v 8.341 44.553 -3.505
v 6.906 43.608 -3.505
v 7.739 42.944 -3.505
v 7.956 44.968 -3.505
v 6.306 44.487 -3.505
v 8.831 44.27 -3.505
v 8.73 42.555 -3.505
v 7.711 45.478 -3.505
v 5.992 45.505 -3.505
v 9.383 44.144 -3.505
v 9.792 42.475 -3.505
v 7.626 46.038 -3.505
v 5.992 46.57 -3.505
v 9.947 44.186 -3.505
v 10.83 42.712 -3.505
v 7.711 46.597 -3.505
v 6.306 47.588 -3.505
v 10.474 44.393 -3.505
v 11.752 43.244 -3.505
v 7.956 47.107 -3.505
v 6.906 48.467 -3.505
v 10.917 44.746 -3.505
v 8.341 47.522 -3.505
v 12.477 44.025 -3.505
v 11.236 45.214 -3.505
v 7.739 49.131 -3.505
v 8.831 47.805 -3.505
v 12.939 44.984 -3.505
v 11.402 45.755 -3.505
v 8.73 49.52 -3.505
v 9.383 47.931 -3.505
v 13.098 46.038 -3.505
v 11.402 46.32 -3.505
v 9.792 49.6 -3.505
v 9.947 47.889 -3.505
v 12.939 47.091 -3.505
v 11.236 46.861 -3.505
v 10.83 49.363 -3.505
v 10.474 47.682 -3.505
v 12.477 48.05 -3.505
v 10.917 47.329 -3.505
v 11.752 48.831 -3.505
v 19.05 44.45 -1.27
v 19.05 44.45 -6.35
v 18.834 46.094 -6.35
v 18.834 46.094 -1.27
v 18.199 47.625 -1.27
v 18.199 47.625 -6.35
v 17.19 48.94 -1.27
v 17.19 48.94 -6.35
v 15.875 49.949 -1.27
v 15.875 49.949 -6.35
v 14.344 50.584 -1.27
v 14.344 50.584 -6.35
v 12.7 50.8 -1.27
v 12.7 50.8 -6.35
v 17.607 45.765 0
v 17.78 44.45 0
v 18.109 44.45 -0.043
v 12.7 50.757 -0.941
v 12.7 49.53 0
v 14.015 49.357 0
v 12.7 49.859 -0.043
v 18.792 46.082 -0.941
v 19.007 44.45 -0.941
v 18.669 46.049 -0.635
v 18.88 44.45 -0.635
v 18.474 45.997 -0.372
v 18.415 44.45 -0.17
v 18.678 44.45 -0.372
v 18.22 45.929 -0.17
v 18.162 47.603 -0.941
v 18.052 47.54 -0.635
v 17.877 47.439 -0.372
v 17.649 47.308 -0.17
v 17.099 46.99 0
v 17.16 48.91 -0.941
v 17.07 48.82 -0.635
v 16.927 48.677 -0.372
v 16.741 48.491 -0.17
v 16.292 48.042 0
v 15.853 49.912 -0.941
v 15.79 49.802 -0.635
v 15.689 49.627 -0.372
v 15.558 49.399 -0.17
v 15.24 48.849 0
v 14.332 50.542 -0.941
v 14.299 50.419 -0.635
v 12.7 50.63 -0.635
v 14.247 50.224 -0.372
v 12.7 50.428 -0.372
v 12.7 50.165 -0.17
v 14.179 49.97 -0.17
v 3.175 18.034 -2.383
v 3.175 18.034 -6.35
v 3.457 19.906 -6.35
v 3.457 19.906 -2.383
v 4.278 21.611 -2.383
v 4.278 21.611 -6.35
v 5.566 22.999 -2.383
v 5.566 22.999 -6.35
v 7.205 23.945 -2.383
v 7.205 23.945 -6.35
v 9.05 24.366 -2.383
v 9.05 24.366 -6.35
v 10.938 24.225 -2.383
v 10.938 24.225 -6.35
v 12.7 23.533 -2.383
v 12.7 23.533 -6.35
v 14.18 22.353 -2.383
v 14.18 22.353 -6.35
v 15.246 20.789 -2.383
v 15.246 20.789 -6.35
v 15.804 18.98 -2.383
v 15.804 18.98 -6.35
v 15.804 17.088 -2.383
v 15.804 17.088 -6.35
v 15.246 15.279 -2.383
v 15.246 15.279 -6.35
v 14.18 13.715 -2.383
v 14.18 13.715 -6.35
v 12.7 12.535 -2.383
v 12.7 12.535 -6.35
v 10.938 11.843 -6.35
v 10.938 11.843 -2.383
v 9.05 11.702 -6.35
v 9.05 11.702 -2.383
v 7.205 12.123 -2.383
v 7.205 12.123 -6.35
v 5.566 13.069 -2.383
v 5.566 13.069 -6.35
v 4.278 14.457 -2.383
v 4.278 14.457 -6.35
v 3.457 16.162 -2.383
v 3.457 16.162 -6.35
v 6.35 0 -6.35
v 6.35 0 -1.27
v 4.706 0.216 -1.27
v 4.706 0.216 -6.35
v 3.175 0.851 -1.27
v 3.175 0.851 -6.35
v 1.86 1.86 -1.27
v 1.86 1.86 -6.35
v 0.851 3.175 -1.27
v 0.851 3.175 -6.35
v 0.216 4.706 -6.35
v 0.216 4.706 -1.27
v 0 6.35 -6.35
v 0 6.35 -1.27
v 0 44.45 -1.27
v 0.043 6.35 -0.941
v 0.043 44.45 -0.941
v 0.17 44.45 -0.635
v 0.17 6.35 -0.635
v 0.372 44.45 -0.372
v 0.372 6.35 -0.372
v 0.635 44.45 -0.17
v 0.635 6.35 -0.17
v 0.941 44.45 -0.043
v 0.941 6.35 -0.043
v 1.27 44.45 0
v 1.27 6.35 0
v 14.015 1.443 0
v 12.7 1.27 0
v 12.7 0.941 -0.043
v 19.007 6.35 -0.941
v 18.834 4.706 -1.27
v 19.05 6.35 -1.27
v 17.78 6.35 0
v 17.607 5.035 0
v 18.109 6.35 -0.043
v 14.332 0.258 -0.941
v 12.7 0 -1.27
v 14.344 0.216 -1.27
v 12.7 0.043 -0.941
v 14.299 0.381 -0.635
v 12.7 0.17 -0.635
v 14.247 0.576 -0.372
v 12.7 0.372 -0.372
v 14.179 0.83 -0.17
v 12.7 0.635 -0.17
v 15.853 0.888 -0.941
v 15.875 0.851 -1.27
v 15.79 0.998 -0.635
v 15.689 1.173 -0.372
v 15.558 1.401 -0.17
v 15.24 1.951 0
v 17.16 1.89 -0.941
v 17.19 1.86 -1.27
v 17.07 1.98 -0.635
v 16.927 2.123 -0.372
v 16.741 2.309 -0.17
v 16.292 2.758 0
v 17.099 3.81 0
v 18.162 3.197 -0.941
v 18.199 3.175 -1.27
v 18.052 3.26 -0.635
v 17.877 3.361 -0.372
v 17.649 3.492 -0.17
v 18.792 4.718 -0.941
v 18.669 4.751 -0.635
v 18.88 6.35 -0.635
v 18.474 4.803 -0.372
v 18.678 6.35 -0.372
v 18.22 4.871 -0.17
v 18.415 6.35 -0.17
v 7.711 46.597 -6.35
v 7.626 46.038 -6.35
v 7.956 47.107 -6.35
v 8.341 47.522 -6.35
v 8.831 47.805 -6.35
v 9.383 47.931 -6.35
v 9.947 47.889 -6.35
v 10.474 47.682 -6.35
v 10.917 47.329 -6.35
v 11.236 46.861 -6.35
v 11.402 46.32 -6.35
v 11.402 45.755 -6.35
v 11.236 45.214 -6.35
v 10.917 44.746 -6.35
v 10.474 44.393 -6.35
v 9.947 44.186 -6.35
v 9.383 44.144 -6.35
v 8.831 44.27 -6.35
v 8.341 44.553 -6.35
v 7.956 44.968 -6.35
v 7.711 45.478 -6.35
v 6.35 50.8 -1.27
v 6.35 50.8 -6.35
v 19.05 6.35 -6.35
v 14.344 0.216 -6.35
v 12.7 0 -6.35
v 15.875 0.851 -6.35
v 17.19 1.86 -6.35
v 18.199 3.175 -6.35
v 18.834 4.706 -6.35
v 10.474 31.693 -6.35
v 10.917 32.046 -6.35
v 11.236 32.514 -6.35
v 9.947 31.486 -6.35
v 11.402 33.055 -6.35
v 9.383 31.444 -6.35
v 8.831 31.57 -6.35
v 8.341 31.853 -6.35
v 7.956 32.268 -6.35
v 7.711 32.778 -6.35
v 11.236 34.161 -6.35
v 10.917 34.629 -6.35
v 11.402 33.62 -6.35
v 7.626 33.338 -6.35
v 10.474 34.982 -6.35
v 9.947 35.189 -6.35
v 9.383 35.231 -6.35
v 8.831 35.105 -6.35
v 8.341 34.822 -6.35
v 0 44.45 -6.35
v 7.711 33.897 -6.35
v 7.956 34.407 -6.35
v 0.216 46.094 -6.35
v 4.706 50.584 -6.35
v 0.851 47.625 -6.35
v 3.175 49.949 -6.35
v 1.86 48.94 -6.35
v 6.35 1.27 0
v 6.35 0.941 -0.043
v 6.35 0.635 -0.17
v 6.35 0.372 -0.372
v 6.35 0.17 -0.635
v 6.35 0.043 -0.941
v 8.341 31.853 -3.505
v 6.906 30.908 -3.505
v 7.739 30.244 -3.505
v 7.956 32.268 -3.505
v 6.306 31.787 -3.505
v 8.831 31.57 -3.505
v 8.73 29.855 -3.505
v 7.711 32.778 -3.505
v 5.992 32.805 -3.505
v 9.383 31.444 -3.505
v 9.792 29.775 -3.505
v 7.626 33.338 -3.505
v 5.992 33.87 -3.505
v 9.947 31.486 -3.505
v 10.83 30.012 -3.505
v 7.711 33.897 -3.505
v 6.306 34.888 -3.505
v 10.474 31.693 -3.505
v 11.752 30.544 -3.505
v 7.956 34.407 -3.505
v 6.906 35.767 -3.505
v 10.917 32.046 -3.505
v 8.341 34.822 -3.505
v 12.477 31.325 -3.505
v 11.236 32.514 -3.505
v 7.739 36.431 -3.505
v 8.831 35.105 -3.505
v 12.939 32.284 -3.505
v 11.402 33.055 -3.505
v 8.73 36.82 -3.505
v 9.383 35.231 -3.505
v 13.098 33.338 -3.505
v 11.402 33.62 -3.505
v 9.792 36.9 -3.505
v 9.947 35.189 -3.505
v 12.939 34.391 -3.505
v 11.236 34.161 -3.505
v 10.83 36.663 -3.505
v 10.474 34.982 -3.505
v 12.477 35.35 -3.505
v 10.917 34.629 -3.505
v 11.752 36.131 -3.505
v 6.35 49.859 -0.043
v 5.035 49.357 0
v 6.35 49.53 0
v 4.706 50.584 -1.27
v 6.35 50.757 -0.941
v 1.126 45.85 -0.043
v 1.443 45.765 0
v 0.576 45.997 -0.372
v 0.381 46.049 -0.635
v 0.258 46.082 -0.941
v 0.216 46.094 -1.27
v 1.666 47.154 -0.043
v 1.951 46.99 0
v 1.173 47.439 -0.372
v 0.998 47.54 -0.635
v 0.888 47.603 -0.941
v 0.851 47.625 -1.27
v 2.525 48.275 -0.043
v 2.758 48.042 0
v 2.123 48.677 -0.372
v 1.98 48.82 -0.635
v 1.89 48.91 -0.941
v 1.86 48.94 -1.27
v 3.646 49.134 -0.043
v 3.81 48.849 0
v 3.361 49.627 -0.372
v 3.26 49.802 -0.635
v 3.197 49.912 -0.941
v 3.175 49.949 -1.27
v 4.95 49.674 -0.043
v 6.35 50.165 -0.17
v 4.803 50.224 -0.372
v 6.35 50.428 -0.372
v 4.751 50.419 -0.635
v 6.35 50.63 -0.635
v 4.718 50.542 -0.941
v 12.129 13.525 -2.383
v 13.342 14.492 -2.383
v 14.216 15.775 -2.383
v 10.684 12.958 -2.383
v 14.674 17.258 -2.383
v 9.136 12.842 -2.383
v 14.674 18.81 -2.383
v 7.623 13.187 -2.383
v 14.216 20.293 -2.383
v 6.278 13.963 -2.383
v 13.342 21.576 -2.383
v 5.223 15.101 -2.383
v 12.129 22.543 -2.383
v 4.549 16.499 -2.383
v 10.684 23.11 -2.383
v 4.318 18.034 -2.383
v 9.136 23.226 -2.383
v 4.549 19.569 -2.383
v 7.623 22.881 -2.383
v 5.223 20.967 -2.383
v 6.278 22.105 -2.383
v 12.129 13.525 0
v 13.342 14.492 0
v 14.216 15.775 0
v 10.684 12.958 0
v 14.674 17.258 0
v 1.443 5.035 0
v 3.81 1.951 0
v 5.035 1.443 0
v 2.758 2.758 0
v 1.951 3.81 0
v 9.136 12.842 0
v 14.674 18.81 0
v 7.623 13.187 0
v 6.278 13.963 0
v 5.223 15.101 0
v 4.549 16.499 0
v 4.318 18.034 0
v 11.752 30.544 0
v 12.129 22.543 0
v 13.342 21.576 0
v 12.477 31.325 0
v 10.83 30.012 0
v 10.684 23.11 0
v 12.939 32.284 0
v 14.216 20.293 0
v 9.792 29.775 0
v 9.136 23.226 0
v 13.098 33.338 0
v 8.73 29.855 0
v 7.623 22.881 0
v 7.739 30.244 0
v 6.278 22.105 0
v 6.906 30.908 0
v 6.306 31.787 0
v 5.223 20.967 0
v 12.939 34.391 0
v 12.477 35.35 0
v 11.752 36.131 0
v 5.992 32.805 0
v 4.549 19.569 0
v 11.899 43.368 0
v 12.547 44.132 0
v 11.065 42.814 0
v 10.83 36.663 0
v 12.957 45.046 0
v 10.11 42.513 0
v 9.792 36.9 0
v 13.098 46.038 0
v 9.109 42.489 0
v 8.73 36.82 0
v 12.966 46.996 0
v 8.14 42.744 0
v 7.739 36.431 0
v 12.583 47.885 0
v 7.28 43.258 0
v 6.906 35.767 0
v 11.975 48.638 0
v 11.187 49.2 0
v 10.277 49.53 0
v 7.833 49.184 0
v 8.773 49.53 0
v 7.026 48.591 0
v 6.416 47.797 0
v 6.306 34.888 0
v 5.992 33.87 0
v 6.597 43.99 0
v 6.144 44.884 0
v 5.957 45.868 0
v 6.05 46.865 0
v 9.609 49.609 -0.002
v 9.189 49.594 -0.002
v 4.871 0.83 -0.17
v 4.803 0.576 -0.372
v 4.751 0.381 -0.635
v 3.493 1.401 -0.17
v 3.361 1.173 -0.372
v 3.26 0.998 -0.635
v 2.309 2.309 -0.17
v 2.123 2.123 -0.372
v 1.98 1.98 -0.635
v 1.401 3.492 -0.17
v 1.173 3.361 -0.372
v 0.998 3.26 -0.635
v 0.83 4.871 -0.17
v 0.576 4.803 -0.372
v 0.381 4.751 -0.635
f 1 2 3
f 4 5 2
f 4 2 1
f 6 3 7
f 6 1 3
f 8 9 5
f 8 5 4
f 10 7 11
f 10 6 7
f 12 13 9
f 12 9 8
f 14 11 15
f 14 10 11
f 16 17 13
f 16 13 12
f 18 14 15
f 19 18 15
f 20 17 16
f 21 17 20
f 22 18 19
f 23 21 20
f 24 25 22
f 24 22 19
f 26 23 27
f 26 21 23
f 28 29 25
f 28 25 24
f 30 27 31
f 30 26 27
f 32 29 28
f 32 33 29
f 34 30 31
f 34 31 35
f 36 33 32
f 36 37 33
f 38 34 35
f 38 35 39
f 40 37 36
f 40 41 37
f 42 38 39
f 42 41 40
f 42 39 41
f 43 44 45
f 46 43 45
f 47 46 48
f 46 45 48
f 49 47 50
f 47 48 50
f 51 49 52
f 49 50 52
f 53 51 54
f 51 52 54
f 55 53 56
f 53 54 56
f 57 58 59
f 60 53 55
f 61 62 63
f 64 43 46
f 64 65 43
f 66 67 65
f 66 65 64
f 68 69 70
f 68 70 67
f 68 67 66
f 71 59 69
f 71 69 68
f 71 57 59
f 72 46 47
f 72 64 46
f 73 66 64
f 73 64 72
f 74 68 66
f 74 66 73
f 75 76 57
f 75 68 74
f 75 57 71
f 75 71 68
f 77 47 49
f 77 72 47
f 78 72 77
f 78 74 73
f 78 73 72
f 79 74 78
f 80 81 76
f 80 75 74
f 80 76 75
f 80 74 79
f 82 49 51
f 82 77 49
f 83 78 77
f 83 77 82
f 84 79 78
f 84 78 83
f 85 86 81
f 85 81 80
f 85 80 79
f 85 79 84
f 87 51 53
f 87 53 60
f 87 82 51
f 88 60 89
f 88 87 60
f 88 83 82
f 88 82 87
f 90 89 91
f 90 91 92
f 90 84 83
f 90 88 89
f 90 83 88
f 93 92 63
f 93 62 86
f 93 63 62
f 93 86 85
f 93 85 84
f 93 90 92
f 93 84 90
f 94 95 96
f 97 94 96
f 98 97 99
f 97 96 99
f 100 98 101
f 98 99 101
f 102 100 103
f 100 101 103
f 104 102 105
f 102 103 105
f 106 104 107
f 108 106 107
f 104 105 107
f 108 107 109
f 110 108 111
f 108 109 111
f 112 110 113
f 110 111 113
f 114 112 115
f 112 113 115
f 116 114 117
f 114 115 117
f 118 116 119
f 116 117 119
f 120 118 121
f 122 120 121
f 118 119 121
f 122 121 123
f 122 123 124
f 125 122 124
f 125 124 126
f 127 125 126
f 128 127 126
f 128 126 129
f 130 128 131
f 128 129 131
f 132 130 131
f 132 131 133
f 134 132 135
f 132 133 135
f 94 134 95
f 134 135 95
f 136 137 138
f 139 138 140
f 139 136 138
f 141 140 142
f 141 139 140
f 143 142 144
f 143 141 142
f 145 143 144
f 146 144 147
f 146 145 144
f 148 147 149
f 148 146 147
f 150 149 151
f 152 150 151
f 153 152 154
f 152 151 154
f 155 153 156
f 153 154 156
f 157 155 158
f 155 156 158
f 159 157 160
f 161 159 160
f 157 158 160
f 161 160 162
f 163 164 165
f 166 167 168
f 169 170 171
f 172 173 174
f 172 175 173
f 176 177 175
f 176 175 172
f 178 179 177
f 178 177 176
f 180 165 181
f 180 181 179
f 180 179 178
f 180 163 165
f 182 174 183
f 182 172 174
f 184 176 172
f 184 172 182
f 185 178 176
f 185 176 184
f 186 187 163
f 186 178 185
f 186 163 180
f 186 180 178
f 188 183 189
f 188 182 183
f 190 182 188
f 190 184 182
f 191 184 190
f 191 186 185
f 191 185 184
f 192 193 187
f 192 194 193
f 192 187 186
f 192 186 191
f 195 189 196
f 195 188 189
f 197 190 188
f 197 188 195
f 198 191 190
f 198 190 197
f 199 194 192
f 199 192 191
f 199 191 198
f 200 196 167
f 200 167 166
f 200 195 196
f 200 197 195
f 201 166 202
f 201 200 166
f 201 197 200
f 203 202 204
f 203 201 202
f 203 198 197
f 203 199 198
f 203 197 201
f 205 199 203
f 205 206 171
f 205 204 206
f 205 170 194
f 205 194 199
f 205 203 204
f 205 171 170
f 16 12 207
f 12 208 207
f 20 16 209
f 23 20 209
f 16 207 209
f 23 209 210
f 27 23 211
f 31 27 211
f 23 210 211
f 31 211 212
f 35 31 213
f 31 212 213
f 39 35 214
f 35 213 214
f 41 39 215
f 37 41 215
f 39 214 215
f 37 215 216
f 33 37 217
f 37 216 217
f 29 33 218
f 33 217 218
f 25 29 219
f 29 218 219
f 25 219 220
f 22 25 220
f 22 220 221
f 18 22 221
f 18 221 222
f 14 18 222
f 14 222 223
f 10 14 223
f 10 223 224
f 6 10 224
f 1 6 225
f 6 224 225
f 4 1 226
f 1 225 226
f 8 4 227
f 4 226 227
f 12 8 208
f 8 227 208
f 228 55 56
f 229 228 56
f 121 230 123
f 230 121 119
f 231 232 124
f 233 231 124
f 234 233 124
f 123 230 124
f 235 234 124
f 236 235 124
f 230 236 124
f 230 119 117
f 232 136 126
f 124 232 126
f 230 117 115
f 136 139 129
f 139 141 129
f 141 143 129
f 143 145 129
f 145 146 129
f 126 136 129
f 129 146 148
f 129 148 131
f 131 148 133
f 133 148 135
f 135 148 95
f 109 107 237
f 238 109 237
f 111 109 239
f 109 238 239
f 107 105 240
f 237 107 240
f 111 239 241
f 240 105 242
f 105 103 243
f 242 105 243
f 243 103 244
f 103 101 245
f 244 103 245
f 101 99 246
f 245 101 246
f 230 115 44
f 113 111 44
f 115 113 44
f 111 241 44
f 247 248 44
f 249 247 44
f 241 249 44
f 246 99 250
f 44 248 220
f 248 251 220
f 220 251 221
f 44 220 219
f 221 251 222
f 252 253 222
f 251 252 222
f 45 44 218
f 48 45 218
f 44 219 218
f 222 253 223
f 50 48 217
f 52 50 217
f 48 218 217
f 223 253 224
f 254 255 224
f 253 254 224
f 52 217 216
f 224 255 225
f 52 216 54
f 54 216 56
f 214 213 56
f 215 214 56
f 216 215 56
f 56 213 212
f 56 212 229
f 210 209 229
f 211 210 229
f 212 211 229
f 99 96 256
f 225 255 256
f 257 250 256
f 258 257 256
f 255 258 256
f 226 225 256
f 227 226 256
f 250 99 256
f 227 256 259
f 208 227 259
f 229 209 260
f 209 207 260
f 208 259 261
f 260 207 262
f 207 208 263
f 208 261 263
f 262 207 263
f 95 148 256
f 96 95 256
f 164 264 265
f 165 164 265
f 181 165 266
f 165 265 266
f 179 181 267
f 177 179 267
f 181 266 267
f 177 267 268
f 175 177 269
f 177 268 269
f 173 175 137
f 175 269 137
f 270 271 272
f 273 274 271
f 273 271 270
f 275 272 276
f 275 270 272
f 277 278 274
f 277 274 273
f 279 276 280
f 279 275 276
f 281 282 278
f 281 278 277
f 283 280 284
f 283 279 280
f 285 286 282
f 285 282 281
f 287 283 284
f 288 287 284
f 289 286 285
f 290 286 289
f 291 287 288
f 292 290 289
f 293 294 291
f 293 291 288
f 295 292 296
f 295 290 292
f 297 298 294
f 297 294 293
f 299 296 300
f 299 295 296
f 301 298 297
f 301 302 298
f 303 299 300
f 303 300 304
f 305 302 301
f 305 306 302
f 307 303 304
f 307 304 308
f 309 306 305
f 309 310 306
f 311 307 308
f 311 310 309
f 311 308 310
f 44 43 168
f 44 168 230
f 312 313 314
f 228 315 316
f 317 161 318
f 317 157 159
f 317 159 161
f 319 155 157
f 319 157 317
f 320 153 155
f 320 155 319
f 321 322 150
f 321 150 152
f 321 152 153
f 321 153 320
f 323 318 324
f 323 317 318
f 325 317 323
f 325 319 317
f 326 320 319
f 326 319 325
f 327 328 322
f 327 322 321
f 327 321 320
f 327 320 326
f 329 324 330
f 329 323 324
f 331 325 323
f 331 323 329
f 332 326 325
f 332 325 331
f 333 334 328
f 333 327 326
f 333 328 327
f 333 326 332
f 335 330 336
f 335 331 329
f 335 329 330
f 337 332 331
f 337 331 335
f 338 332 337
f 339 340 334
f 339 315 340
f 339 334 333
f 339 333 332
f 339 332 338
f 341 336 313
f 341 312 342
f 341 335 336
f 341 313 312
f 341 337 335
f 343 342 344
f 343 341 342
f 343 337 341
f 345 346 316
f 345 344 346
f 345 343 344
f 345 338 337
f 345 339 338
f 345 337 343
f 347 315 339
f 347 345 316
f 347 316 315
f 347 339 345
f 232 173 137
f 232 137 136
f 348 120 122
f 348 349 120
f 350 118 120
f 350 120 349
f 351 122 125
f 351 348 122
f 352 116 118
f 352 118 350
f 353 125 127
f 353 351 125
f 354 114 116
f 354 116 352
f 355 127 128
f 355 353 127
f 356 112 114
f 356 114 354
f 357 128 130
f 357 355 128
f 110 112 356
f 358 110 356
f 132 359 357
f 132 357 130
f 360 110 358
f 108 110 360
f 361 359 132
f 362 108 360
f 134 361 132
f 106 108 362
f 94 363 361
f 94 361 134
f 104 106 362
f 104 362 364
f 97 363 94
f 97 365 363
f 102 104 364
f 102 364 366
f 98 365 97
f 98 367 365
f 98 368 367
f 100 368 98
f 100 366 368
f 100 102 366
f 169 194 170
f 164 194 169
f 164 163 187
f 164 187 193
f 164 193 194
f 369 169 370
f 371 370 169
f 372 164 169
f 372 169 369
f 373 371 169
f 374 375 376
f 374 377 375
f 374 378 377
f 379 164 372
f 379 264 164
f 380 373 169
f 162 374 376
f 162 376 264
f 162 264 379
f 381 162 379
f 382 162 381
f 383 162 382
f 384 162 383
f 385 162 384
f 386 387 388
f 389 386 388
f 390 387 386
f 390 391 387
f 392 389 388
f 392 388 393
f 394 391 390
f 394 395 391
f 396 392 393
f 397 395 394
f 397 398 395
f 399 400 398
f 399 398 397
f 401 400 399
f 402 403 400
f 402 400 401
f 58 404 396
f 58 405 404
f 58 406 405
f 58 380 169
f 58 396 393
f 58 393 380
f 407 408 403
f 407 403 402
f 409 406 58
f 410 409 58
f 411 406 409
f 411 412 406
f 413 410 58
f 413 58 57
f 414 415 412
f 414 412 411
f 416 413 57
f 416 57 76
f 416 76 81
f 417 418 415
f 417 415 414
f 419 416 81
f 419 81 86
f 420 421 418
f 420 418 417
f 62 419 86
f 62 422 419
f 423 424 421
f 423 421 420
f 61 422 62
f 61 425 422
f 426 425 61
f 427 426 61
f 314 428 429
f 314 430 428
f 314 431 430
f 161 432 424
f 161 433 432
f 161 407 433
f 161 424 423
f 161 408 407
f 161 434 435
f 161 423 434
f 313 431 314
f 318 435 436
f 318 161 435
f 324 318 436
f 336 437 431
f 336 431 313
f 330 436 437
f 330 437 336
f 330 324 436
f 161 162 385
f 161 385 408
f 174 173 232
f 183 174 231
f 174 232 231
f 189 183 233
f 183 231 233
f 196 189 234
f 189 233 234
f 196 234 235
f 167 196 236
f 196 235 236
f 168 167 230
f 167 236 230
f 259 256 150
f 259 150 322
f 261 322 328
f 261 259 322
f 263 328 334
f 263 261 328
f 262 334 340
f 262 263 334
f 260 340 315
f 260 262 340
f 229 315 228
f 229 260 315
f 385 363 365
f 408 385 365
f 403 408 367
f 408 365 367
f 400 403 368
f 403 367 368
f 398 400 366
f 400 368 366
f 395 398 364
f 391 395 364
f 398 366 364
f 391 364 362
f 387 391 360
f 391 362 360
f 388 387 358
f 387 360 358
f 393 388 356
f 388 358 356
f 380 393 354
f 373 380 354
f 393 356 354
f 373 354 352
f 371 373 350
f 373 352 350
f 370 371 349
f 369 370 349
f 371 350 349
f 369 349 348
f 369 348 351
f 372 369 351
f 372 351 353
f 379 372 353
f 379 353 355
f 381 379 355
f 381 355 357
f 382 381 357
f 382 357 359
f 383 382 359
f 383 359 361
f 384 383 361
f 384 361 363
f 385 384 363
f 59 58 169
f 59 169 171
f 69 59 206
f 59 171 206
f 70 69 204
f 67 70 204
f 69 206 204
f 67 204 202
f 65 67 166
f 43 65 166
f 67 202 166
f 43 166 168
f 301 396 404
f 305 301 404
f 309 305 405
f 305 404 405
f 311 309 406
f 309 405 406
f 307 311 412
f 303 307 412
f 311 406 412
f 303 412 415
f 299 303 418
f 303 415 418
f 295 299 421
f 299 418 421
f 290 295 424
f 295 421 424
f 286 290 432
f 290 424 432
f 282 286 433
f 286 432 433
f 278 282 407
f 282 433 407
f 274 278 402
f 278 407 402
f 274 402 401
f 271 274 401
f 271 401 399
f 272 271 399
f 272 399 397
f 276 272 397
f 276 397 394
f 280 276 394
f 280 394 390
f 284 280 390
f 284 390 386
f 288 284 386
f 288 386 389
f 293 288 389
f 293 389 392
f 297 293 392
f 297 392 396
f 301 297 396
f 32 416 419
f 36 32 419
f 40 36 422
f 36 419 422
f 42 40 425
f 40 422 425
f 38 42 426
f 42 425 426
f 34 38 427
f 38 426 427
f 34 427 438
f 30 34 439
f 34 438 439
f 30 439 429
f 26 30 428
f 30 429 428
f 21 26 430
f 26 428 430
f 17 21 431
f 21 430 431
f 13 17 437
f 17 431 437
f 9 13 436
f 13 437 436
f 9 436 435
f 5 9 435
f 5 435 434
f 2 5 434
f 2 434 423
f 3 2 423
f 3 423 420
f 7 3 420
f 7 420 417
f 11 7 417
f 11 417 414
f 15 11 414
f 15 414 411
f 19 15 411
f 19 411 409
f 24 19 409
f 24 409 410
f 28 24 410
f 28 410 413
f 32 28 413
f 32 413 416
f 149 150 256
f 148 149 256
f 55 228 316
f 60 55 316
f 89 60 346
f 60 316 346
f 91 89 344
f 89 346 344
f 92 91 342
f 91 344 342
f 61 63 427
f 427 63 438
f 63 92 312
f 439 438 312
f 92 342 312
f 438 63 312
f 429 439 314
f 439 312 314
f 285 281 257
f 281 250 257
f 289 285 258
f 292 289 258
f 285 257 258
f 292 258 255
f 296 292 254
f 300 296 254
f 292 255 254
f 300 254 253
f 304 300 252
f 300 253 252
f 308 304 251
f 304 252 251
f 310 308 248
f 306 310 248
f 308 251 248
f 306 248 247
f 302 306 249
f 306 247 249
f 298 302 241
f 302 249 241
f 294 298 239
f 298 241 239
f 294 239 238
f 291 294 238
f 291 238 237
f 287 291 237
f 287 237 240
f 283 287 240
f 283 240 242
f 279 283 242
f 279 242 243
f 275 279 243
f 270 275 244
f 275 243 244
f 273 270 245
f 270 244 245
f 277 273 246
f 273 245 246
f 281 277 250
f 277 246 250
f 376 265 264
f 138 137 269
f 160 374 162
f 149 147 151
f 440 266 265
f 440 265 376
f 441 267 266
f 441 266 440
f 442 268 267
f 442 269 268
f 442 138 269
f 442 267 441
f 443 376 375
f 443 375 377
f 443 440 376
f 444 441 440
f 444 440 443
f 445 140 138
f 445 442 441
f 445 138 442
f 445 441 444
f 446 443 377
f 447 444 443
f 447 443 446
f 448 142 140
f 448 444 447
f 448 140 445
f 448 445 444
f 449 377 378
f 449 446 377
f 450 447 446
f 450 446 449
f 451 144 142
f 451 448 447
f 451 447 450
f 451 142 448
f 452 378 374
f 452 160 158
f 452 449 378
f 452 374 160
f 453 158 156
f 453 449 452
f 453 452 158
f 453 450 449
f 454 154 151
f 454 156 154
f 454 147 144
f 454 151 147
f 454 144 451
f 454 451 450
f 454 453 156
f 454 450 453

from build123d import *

# Parameters (mm, degrees)
SKETCH1_W                                      = 6.35
SKETCH1_H                                      = 50.8
BODY_DEPTH                                     = 19.05
SKETCH2_R                                      = 5.207
PITCH_AXLE_OPENING_DEPTH                       = 6.35
CBORE_FOR_6_SOCKET_HEAD_CAP_SCREW1_D           = 3.7973
CBORE_FOR_6_SOCKET_HEAD_CAP_SCREW1_CBORE_D     = 7.14502
CBORE_FOR_6_SOCKET_HEAD_CAP_SCREW1_CBORE_DEPTH = 3.5052
FILLET1_R                                      = 6.35
FILLET2_R                                      = 1.27
SKETCH2_3_R                                    = 6.35
SKETCH2_3_R_2                                  = 5.207
BEARING_RECESS_DEPTH                           = 3.96748


with BuildPart() as part:
    # Sketch1 → Body (new body)
    with BuildSketch(Plane(origin=(0, 0, 0), x_dir=(0, 0, -1), z_dir=(1, 0, 0))):
        with Locations((3.175, 25.4)):
            Rectangle(SKETCH1_W, SKETCH1_H)
    extrude(amount=BODY_DEPTH)

    # Sketch2 → Pitch Axle Opening (cut)
    with BuildSketch(Plane(origin=(0, 0, -6.35), x_dir=(-1, 0, 0), z_dir=(0, 0, -1))):
        with Locations((-9.525, 18.034)):
            Circle(SKETCH2_R)
    extrude(amount=-PITCH_AXLE_OPENING_DEPTH, mode=Mode.SUBTRACT)

    # CBORE for #6 Socket Head Cap Screw1 (through all)
    with Locations(Plane.XY):
        with Locations((9.525, 46.0375), (9.525, 33.3375)):
            CounterBoreHole(CBORE_FOR_6_SOCKET_HEAD_CAP_SCREW1_D / 2, CBORE_FOR_6_SOCKET_HEAD_CAP_SCREW1_CBORE_D / 2, CBORE_FOR_6_SOCKET_HEAD_CAP_SCREW1_CBORE_DEPTH)

    # Fillet1
    fillet1_edges = [part.edges().sort_by_distance(p)[0] for p in [
        (19.05, 50.8, -3.175),
        (19.05, 0, -3.175),
        (0, 50.8, -3.175),
        (0, 0, -3.175),
    ]]
    fillet(fillet1_edges, radius=FILLET1_R)

    # Fillet2
    # the kernel refuses this fillet: 1.27 mm, written as the material it takes off along each edge
    with BuildSketch(Plane(origin=(6.35, 50.8, 0), x_dir=(0, -1, 0), z_dir=(1, 0, 0))) as fillet2_piece_1:
        with BuildLine():
            CenterArc((FILLET2_R, FILLET2_R), FILLET2_R, 180, 90)
            Line((0, FILLET2_R), (0, 0))
            Line((0, 0), (FILLET2_R, 0))
        make_face()
    extrude(amount=6.35, mode=Mode.SUBTRACT)
    with BuildSketch(Plane(origin=(0, 6.35, 0), x_dir=(1, 0, 0), z_dir=(0, 1, 0))) as fillet2_piece_2:
        with BuildLine():
            CenterArc((FILLET2_R, FILLET2_R), FILLET2_R, 180, 90)
            Line((0, FILLET2_R), (0, 0))
            Line((0, 0), (FILLET2_R, 0))
        make_face()
    extrude(amount=38.1, mode=Mode.SUBTRACT)
    with BuildSketch(Plane(origin=(6.35, 0, 0), x_dir=(0, 1, 0), z_dir=(1, 0, 0))) as fillet2_piece_3:
        with BuildLine():
            CenterArc((FILLET2_R, -FILLET2_R), FILLET2_R, 90, 90)
            Line((0, -FILLET2_R), (0, 0))
            Line((0, 0), (FILLET2_R, 0))
        make_face()
    extrude(amount=6.35, mode=Mode.SUBTRACT)
    with BuildSketch(Plane(origin=(19.05, 6.35, 0), x_dir=(-1, 0, 0), z_dir=(0, 1, 0))) as fillet2_piece_4:
        with BuildLine():
            CenterArc((FILLET2_R, -FILLET2_R), FILLET2_R, 90, 90)
            Line((0, -FILLET2_R), (0, 0))
            Line((0, 0), (FILLET2_R, 0))
        make_face()
    extrude(amount=38.1, mode=Mode.SUBTRACT)
    with BuildSketch(Plane(origin=(12.7, 6.35, 0), x_dir=(0, -1, 0), z_dir=(-1, 0, 0))) as fillet2_piece_5:
        with BuildLine():
            CenterArc((6.35 - FILLET2_R, -FILLET2_R), FILLET2_R, 0, 90)
            Line((6.35, -FILLET2_R), (6.35, 0))
            Line((6.35, 0), (6.35 - FILLET2_R, 0))
        make_face()
    revolve(axis=Axis((12.7, 6.35, 0), (0, 0, 1)), revolution_arc=90, mode=Mode.SUBTRACT)
    with BuildSketch(Plane(origin=(6.35, 6.35, 0), x_dir=(0, -1, 0), z_dir=(1, 0, 0))) as fillet2_piece_6:
        with BuildLine():
            CenterArc((6.35 - FILLET2_R, FILLET2_R), FILLET2_R, 270, 90)
            Line((6.35, FILLET2_R), (6.35, 0))
            Line((6.35, 0), (6.35 - FILLET2_R, 0))
        make_face()
    revolve(axis=Axis((6.35, 6.35, 0), (0, 0, -1)), revolution_arc=90, mode=Mode.SUBTRACT)
    with BuildSketch(Plane(origin=(12.7, 44.45, 0), x_dir=(1, 0, 0), z_dir=(0, -1, 0))) as fillet2_piece_7:
        with BuildLine():
            CenterArc((6.35 - FILLET2_R, -FILLET2_R), FILLET2_R, 0, 90)
            Line((6.35, -FILLET2_R), (6.35, 0))
            Line((6.35, 0), (6.35 - FILLET2_R, 0))
        make_face()
    revolve(axis=Axis((12.7, 44.45, 0), (0, 0, 1)), revolution_arc=90, mode=Mode.SUBTRACT)
    with BuildSketch(Plane(origin=(6.35, 44.45, 0), x_dir=(-1, 0, 0), z_dir=(0, -1, 0))) as fillet2_piece_8:
        with BuildLine():
            CenterArc((6.35 - FILLET2_R, FILLET2_R), FILLET2_R, 270, 90)
            Line((6.35, FILLET2_R), (6.35, 0))
            Line((6.35, 0), (6.35 - FILLET2_R, 0))
        make_face()
    revolve(axis=Axis((6.35, 44.45, 0), (0, 0, -1)), revolution_arc=90, mode=Mode.SUBTRACT)

    # Sketch2<3> → Bearing Recess (cut)
    with BuildSketch(Plane(origin=(0, 0, -6.35), x_dir=(-1, 0, 0), z_dir=(0, 0, -1))):
        with Locations((-9.525, 18.034)):
            Circle(SKETCH2_3_R)
        with Locations((-9.525, 18.034)):
            Circle(SKETCH2_3_R_2, mode=Mode.SUBTRACT)
    extrude(amount=-BEARING_RECESS_DEPTH, mode=Mode.SUBTRACT)


solid = part.part
